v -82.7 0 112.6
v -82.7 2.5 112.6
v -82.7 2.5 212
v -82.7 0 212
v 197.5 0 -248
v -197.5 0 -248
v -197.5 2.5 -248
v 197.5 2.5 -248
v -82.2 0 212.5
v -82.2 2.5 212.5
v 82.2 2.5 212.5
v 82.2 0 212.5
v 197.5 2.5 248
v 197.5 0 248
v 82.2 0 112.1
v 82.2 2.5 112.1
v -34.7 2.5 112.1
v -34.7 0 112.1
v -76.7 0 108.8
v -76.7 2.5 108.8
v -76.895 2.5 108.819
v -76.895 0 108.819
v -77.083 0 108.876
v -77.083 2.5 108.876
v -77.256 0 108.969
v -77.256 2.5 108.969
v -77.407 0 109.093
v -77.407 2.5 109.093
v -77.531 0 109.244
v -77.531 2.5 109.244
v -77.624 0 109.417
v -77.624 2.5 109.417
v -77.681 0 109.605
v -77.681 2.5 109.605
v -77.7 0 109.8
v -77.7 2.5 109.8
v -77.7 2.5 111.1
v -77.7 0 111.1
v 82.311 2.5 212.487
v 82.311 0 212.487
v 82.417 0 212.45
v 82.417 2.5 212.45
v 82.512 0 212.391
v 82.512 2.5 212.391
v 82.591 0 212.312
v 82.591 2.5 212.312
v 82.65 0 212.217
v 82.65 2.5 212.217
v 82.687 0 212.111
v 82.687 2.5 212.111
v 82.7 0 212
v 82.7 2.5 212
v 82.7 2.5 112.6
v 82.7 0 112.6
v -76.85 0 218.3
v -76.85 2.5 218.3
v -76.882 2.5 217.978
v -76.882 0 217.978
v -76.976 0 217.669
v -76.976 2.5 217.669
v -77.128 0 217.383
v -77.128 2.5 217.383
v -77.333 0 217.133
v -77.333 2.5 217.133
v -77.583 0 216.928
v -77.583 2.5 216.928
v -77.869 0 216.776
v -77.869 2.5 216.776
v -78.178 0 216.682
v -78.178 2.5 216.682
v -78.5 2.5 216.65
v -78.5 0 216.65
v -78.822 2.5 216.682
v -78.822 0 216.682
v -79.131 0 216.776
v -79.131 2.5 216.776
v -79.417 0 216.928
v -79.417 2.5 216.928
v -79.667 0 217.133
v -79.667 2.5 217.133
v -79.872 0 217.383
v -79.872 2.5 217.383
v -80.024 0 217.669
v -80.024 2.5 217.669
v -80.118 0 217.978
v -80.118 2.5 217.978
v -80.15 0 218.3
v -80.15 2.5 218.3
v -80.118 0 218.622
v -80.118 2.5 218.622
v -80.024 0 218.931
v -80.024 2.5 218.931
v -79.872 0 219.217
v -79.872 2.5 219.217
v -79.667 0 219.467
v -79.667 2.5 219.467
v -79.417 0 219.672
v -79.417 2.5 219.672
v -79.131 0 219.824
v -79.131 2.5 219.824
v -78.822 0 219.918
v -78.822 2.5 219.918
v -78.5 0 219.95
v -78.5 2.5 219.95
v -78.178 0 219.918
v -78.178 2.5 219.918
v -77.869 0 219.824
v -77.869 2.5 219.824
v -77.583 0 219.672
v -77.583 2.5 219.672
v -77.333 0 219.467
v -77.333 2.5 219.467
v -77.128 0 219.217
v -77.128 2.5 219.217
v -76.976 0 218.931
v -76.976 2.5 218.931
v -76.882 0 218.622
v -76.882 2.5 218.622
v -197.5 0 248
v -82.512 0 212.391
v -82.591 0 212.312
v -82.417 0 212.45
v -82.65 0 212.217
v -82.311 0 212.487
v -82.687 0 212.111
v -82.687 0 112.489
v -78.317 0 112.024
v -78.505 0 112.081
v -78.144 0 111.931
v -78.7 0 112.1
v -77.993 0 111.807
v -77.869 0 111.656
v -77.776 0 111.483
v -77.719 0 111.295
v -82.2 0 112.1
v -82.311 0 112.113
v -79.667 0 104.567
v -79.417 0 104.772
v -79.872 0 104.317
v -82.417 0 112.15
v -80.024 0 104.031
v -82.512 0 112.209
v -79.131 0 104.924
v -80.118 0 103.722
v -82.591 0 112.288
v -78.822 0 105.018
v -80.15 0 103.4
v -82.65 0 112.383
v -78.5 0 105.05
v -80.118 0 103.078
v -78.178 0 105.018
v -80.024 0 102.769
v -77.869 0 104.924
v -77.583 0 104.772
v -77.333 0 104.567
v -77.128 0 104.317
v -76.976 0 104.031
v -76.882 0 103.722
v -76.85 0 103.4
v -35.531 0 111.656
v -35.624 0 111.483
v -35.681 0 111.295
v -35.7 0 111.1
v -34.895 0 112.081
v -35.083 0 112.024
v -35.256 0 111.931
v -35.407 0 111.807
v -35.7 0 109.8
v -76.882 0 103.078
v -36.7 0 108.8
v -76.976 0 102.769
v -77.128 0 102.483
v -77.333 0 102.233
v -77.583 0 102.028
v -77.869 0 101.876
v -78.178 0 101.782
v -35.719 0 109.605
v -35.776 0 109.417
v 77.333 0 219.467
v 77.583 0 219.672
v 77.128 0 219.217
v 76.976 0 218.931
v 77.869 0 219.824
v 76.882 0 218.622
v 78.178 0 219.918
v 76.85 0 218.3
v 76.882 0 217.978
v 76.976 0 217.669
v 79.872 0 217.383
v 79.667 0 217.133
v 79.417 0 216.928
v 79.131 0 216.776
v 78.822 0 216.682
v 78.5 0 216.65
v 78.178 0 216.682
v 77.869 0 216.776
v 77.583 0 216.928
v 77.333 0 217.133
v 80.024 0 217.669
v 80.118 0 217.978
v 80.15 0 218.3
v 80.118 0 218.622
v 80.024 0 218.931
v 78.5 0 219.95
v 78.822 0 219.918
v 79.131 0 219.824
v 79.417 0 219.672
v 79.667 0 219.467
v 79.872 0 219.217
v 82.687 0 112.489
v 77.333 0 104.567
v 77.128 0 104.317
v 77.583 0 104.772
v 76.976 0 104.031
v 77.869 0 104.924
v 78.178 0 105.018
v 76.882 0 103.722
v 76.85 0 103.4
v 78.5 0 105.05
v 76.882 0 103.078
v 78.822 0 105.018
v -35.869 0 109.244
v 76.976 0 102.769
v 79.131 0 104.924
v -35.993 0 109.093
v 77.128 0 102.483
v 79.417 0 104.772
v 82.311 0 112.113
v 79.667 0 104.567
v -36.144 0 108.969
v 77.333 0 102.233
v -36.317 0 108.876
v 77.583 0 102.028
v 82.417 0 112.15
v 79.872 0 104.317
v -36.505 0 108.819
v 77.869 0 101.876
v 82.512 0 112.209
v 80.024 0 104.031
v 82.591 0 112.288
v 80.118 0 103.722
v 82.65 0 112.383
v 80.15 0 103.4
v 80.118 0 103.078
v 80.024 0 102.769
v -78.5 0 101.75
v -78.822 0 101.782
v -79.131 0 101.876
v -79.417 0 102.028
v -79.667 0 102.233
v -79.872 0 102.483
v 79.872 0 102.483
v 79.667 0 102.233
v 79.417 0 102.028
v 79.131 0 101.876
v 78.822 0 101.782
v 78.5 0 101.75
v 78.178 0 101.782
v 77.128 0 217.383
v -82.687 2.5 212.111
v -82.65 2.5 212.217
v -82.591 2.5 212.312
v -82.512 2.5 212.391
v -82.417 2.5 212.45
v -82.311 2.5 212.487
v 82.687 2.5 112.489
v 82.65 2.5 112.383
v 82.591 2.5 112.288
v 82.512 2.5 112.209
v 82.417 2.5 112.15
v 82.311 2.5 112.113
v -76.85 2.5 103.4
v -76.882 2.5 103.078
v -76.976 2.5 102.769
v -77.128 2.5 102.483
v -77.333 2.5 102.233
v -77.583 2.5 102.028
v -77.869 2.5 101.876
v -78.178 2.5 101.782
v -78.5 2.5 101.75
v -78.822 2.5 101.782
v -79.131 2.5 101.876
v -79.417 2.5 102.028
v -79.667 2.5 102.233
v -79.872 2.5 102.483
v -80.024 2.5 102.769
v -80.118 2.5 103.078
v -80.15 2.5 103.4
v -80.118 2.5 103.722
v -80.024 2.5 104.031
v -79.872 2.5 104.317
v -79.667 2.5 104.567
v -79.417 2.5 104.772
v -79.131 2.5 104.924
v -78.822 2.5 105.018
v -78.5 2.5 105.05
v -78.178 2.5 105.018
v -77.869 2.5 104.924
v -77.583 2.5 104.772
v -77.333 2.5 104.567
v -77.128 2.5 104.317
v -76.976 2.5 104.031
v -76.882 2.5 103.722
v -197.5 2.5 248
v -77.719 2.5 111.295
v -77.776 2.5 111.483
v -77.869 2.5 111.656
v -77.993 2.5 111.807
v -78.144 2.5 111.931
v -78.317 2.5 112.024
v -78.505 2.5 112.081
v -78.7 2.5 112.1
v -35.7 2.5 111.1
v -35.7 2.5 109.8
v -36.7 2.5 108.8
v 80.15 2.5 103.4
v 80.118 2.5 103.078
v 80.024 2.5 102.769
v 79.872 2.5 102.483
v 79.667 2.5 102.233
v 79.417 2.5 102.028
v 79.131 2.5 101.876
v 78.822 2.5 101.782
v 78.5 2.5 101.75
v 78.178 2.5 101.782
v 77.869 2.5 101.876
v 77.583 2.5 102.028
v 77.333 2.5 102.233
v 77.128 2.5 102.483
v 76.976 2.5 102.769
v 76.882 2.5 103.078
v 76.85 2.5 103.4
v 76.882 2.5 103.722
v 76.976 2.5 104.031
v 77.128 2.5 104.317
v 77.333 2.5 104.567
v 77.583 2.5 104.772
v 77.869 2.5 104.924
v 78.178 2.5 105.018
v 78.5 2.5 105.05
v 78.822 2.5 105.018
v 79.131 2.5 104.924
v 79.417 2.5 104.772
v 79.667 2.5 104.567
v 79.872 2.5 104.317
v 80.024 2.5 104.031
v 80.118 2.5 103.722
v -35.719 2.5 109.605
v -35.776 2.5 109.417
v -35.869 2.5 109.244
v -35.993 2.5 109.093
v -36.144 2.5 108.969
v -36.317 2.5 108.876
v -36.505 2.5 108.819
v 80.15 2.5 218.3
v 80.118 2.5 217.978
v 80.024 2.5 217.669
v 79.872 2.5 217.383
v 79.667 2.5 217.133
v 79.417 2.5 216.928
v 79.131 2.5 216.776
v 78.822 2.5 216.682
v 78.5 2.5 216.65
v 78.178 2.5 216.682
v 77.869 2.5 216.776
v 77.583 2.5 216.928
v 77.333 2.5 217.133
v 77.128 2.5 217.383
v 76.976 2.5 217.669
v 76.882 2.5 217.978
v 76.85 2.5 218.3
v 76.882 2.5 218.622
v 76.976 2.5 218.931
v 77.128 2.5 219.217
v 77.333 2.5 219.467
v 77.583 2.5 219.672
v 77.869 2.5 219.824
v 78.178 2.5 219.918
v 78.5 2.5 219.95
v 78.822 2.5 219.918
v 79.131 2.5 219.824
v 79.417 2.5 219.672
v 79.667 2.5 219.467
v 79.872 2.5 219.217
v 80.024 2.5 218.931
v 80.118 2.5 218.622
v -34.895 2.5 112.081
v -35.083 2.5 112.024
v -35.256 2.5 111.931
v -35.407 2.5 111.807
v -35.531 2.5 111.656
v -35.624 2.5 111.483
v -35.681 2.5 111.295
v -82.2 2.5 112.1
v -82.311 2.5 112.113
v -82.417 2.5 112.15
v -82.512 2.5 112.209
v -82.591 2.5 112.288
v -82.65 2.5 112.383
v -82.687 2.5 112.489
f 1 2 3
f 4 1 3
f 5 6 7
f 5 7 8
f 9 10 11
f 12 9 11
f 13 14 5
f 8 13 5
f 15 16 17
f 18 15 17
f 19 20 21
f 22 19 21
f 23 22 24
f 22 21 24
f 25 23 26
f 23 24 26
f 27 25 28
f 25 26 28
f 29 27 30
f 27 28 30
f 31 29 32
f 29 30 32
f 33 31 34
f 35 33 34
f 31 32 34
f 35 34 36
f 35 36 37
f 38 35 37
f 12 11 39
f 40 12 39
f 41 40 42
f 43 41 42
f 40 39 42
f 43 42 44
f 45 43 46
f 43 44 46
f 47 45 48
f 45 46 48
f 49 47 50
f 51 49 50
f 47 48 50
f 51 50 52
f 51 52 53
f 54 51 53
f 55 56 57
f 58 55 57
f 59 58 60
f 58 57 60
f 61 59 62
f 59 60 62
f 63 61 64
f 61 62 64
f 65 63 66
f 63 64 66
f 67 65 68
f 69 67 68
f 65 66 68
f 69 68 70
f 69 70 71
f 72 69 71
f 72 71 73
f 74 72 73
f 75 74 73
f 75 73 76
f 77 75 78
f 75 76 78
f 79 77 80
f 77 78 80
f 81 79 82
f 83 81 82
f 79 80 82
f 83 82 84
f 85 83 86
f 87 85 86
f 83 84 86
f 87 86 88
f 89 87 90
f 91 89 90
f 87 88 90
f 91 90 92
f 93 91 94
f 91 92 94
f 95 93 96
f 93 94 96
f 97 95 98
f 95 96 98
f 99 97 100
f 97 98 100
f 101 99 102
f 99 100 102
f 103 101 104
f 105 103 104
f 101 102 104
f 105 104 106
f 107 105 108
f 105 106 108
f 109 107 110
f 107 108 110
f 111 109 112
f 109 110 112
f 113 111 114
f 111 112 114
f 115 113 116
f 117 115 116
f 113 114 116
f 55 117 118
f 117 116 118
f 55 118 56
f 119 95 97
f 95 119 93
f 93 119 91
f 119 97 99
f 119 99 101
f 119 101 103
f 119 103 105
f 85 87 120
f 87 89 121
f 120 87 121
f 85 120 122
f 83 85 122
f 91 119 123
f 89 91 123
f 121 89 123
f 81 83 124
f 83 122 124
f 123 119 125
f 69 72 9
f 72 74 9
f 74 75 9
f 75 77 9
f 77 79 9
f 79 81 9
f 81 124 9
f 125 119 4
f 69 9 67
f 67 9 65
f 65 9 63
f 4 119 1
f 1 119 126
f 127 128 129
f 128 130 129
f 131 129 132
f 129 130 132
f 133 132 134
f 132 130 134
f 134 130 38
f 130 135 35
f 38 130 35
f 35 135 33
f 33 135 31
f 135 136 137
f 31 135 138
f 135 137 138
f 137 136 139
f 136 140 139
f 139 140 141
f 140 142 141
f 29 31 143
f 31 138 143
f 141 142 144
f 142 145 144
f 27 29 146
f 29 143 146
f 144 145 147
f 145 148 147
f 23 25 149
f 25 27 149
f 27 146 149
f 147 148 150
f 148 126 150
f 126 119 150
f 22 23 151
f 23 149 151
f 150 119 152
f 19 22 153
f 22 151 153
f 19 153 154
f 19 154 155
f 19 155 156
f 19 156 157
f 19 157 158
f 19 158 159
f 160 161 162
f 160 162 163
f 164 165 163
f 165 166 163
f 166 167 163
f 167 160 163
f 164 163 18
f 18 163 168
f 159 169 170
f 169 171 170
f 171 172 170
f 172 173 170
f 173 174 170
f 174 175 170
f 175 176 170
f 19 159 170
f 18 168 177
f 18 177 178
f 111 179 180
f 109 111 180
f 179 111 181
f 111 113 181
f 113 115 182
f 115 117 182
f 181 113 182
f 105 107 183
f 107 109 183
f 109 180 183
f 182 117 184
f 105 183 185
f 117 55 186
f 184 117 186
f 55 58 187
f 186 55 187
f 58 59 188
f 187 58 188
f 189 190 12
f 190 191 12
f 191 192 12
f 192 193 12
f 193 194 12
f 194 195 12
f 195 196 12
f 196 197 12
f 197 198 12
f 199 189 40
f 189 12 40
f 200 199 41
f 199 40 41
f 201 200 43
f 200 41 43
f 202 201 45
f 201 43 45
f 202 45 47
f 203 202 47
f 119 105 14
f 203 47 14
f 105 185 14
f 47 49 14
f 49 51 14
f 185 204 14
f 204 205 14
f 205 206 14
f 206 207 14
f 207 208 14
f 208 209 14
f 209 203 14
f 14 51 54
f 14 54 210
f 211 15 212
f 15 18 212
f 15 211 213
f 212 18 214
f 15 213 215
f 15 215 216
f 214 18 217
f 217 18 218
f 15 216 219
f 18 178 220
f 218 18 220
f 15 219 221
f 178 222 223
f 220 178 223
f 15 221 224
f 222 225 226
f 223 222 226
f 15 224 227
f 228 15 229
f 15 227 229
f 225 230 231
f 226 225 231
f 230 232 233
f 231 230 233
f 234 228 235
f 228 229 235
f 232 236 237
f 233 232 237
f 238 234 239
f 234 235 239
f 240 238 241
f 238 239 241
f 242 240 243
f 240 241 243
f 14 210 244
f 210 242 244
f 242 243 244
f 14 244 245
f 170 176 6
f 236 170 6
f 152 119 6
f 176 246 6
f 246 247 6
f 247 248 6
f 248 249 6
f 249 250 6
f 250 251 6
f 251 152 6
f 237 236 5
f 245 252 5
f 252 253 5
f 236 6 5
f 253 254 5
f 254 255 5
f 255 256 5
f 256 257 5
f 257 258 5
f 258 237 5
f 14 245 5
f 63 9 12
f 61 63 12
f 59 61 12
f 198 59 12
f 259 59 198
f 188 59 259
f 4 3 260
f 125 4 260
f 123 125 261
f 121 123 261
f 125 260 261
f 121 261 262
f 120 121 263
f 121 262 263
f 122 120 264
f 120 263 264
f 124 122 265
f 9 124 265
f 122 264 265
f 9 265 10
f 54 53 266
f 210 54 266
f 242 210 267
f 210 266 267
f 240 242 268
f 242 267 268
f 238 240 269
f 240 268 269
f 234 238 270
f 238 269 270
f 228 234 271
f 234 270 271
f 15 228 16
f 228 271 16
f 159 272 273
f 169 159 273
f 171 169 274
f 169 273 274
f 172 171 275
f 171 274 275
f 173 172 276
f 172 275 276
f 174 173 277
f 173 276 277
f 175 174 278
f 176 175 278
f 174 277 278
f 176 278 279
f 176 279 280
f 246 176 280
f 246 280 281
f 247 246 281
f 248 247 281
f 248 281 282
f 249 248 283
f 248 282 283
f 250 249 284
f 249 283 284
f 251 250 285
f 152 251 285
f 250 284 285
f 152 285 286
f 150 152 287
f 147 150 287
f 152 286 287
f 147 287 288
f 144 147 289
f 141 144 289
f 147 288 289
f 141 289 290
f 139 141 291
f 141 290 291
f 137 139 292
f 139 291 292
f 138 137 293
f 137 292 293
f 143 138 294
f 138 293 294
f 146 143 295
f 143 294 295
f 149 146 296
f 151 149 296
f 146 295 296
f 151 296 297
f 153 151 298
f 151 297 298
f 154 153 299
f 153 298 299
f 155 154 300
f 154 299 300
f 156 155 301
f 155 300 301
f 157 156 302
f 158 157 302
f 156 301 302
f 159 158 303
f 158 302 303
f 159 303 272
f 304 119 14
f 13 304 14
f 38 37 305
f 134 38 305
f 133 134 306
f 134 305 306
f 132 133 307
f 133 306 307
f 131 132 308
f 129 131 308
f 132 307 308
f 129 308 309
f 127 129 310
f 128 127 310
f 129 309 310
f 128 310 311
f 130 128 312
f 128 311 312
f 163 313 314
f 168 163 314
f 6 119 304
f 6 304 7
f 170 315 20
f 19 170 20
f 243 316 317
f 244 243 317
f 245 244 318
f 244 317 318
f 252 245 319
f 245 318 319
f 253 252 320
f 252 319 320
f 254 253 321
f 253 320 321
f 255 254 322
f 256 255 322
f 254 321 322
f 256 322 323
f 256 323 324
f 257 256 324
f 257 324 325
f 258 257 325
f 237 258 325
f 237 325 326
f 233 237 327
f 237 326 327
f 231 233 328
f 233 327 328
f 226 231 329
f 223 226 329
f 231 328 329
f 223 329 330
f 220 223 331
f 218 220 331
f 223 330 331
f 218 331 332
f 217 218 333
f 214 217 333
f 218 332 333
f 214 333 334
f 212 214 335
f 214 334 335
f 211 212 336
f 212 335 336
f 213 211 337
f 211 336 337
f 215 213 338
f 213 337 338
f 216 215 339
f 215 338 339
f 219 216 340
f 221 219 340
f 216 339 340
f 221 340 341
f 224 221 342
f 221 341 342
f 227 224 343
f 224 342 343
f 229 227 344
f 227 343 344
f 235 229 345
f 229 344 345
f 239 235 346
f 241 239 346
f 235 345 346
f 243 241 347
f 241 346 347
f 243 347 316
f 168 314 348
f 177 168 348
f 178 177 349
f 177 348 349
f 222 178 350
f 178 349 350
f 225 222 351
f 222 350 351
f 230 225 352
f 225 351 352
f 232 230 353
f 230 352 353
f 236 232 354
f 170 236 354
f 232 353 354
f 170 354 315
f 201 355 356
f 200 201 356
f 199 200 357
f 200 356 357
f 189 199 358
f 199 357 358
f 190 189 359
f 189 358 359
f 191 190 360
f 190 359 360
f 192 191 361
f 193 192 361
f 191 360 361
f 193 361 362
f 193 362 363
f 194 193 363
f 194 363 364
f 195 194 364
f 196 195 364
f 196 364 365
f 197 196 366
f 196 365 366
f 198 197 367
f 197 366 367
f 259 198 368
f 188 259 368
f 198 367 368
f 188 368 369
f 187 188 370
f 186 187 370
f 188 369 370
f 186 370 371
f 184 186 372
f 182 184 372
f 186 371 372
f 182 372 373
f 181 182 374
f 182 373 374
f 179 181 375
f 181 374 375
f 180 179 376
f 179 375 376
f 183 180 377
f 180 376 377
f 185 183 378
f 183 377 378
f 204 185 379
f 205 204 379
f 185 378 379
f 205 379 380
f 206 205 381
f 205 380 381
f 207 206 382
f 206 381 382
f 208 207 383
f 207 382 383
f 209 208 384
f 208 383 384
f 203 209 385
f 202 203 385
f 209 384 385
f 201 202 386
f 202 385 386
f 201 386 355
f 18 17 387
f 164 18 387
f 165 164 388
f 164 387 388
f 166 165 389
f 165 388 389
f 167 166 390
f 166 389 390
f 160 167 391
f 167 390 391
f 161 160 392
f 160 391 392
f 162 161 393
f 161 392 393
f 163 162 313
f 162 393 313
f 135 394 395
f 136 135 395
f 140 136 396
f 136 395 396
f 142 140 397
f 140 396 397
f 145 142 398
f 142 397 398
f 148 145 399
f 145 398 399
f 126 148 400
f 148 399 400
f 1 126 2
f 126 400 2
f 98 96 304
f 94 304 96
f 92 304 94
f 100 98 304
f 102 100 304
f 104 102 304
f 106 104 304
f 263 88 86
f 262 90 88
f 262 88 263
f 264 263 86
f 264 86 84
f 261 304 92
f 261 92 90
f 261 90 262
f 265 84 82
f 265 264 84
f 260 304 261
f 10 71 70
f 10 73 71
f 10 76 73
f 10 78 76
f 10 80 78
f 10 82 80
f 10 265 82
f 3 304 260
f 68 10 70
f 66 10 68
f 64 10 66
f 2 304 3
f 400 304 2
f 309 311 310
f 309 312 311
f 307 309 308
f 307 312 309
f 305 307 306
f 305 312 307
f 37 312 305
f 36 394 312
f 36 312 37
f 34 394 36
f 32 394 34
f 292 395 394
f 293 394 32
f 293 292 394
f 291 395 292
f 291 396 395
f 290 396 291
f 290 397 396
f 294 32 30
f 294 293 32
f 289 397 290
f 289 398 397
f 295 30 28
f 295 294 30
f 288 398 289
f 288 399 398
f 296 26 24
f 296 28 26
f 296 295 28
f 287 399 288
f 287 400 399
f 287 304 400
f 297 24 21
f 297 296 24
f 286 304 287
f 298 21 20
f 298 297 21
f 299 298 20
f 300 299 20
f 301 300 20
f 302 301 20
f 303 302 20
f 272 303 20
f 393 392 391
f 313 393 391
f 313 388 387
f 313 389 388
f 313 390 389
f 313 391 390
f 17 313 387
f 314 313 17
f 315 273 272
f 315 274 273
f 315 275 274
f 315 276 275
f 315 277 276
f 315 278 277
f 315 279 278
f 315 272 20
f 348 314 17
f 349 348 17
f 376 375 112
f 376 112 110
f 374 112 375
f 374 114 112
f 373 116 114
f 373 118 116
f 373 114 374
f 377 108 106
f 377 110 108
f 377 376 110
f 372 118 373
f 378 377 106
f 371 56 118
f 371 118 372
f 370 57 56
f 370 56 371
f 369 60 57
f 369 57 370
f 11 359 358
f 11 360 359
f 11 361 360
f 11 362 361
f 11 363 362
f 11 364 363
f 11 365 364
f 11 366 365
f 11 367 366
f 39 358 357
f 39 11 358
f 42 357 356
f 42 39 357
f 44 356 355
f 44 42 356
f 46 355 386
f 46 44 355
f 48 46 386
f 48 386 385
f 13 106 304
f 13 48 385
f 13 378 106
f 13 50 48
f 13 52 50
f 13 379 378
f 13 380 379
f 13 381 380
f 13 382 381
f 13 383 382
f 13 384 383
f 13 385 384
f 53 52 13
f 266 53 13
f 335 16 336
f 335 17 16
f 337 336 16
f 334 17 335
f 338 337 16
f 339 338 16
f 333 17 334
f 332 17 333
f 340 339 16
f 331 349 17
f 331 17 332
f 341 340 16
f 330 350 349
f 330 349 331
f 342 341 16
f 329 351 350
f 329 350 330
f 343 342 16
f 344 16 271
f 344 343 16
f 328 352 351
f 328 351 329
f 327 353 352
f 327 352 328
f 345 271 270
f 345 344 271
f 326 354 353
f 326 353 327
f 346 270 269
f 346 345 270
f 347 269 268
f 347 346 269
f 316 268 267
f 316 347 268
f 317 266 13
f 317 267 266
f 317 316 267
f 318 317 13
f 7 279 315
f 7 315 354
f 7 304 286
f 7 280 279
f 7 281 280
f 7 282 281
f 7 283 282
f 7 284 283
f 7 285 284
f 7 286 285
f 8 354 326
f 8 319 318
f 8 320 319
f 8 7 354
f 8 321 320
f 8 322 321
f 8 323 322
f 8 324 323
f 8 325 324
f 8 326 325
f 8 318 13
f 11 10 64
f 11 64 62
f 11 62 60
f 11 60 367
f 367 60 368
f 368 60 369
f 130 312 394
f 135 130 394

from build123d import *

# Parameters (mm, degrees)
SKETCH1_W           = 395
SKETCH1_H           = 496
BOSS_EXTRUDE1_DEPTH = 2.5
CUT_EXTRUDE1_DEPTH  = 2.5
SKETCH6_R           = 1.65
CUT_EXTRUDE2_DEPTH  = 2.5


with BuildPart() as part:
    # Sketch1 → Boss-Extrude1 (new body)
    with BuildSketch(Plane(origin=(0, 0, 0), x_dir=(1, 0, 0), z_dir=(0, 1, 0))):
        Rectangle(SKETCH1_W, SKETCH1_H)
    extrude(amount=BOSS_EXTRUDE1_DEPTH)

    # Sketch4 → Cut-Extrude1 (cut)
    with BuildSketch(Plane(origin=(0, 2.5, 0), x_dir=(1, 0, 0), z_dir=(0, 1, 0))):
        with BuildLine():
            Line((-78.7, -112.1), (-82.2, -112.1))
            ThreePointArc((-82.2, -112.1), (-82.553553391, -112.246446609), (-82.7, -112.6))
            Line((-82.7, -112.6), (-82.7, -212))
            ThreePointArc((-82.7, -212), (-82.553553391, -212.353553391), (-82.2, -212.5))
            Line((-82.2, -212.5), (82.2, -212.5))
            ThreePointArc((82.2, -212.5), (82.553553391, -212.353553391), (82.7, -212))
            Line((82.7, -212), (82.7, -112.6))
            ThreePointArc((82.7, -112.6), (82.553553391, -112.246446609), (82.2, -112.1))
            Line((82.2, -112.1), (-34.7, -112.1))
            ThreePointArc((-34.7, -112.1), (-35.407106781, -111.807106781), (-35.7, -111.1))
            Line((-35.7, -111.1), (-35.7, -109.8))
            ThreePointArc((-35.7, -109.8), (-35.992893219, -109.092893219), (-36.7, -108.8))
            Line((-36.7, -108.8), (-76.7, -108.8))
            ThreePointArc((-76.7, -108.8), (-77.407106781, -109.092893219), (-77.7, -109.8))
            Line((-77.7, -109.8), (-77.7, -111.1))
            ThreePointArc((-77.7, -111.1), (-77.992893219, -111.807106781), (-78.7, -112.1))
        make_face()
    extrude(amount=-CUT_EXTRUDE1_DEPTH, mode=Mode.SUBTRACT)

    # Sketch6 → Cut-Extrude2 (cut)
    with BuildSketch(Plane(origin=(0, 2.5, 0), x_dir=(1, 0, 0), z_dir=(0, 1, 0))):
        with Locations((78.5, -103.4)):
            Circle(SKETCH6_R)
        with Locations((-78.5, -103.4)):
            Circle(SKETCH6_R)
        with Locations((-78.5, -218.3)):
            Circle(SKETCH6_R)
        with Locations((78.5, -218.3)):
            Circle(SKETCH6_R)
    extrude(amount=-CUT_EXTRUDE2_DEPTH, mode=Mode.SUBTRACT)


solid = part.part
